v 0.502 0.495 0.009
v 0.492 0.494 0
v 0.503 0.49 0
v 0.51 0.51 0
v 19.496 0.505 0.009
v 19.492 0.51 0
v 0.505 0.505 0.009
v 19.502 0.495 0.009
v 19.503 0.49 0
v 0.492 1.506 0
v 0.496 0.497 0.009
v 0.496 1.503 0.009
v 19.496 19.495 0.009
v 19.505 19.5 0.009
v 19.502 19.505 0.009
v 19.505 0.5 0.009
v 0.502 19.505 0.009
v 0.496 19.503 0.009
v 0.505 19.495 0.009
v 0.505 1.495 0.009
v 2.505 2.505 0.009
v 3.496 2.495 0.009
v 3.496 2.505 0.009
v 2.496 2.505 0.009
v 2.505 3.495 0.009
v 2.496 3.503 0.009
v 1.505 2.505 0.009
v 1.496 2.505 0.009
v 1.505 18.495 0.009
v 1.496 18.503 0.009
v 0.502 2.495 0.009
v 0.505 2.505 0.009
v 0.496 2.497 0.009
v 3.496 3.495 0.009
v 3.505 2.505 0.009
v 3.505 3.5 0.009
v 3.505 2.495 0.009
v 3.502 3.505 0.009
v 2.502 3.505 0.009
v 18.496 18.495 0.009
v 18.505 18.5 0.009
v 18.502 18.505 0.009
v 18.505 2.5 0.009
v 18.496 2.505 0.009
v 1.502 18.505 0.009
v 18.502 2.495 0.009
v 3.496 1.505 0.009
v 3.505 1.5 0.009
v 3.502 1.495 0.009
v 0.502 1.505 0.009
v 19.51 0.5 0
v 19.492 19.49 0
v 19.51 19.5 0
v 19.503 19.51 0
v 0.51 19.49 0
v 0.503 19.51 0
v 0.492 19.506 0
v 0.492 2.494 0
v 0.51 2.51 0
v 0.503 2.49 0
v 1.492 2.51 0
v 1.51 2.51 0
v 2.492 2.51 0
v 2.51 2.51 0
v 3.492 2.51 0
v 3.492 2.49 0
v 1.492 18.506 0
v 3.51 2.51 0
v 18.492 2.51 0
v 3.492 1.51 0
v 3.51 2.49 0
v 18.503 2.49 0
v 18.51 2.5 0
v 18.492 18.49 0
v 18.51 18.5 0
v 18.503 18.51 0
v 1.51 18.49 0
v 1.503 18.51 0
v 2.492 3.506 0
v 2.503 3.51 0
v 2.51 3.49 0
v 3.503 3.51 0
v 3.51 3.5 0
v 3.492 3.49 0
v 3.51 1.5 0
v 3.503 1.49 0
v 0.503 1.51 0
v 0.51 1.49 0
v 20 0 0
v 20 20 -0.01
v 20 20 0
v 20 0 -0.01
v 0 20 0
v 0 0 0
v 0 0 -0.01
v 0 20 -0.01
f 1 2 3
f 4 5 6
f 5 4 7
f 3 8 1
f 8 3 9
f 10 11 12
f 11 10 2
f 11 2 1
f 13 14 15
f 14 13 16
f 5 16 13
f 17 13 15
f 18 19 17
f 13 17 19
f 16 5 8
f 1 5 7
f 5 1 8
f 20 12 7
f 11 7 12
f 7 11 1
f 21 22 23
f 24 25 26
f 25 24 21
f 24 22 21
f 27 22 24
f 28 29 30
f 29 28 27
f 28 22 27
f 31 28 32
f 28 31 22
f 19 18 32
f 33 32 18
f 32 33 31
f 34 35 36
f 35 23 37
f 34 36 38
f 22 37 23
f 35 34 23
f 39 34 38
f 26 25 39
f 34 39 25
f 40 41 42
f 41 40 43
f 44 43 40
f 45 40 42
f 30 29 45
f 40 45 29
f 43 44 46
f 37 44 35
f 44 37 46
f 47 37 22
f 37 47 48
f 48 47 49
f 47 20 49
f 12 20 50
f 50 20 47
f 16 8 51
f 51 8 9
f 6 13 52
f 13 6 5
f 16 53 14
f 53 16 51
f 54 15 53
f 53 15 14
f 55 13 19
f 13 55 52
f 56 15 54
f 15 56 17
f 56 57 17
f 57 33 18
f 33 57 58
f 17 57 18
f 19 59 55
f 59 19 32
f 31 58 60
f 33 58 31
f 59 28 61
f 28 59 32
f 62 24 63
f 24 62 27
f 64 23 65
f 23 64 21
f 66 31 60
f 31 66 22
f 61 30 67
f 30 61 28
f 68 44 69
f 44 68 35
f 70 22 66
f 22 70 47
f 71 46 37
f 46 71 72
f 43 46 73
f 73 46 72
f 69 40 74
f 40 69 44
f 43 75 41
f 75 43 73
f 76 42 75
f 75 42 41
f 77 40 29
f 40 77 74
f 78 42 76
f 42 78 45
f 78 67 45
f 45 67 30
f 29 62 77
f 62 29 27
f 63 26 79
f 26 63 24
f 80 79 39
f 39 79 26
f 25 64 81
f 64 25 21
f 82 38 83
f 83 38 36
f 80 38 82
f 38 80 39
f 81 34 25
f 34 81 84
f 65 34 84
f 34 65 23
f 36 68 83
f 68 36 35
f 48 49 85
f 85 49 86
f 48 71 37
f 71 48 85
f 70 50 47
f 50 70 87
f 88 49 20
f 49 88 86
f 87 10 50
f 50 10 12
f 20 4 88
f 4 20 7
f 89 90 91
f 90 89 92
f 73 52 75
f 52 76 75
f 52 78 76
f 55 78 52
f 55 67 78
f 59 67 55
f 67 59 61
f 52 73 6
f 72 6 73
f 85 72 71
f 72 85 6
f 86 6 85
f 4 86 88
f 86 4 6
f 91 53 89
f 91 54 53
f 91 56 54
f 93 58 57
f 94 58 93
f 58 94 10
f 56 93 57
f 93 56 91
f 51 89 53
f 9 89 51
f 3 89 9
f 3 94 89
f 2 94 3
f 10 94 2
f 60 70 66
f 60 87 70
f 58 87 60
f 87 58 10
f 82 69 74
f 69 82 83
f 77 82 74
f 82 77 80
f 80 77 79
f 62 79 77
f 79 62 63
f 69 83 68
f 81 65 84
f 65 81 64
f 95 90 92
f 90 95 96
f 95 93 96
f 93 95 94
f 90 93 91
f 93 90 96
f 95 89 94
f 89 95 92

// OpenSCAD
hull(){
    translate([0.5, 0.5]) sphere(0.01);
    translate([1.5, 0.5]) sphere(0.01);
}
hull(){
    translate([1.5, 0.5]) sphere(0.01);
    translate([2.5, 0.5]) sphere(0.01);
}
hull(){
    translate([2.5, 0.5]) sphere(0.01);
    translate([3.5, 0.5]) sphere(0.01);
}
hull(){
    translate([3.5, 0.5]) sphere(0.01);
    translate([4.5, 0.5]) sphere(0.01);
}
hull(){
    translate([4.5, 0.5]) sphere(0.01);
    translate([5.5, 0.5]) sphere(0.01);
}
hull(){
    translate([5.5, 0.5]) sphere(0.01);
    translate([6.5, 0.5]) sphere(0.01);
}
hull(){
    translate([6.5, 0.5]) sphere(0.01);
    translate([7.5, 0.5]) sphere(0.01);
}
hull(){
    translate([7.5, 0.5]) sphere(0.01);
    translate([8.5, 0.5]) sphere(0.01);
}
hull(){
    translate([8.5, 0.5]) sphere(0.01);
    translate([9.5, 0.5]) sphere(0.01);
}
hull(){
    translate([9.5, 0.5]) sphere(0.01);
    translate([10.5, 0.5]) sphere(0.01);
}
hull(){
    translate([10.5, 0.5]) sphere(0.01);
    translate([11.5, 0.5]) sphere(0.01);
}
hull(){
    translate([11.5, 0.5]) sphere(0.01);
    translate([12.5, 0.5]) sphere(0.01);
}
hull(){
    translate([12.5, 0.5]) sphere(0.01);
    translate([13.5, 0.5]) sphere(0.01);
}
hull(){
    translate([13.5, 0.5]) sphere(0.01);
    translate([14.5, 0.5]) sphere(0.01);
}
hull(){
    translate([14.5, 0.5]) sphere(0.01);
    translate([15.5, 0.5]) sphere(0.01);
}
hull(){
    translate([15.5, 0.5]) sphere(0.01);
    translate([16.5, 0.5]) sphere(0.01);
}
hull(){
    translate([16.5, 0.5]) sphere(0.01);
    translate([17.5, 0.5]) sphere(0.01);
}
hull(){
    translate([17.5, 0.5]) sphere(0.01);
    translate([18.5, 0.5]) sphere(0.01);
}
hull(){
    translate([18.5, 0.5]) sphere(0.01);
    translate([19.5, 0.5]) sphere(0.01);
}
hull(){
    translate([19.5, 0.5]) sphere(0.01);
    translate([19.5, 1.5]) sphere(0.01);
}
hull(){
    translate([19.5, 1.5]) sphere(0.01);
    translate([19.5, 2.5]) sphere(0.01);
}
hull(){
    translate([19.5, 2.5]) sphere(0.01);
    translate([19.5, 3.5]) sphere(0.01);
}
hull(){
    translate([19.5, 3.5]) sphere(0.01);
    translate([19.5, 4.5]) sphere(0.01);
}
hull(){
    translate([19.5, 4.5]) sphere(0.01);
    translate([19.5, 5.5]) sphere(0.01);
}
hull(){
    translate([19.5, 5.5]) sphere(0.01);
    translate([19.5, 6.5]) sphere(0.01);
}
hull(){
    translate([19.5, 6.5]) sphere(0.01);
    translate([19.5, 7.5]) sphere(0.01);
}
hull(){
    translate([19.5, 7.5]) sphere(0.01);
    translate([19.5, 8.5]) sphere(0.01);
}
hull(){
    translate([19.5, 8.5]) sphere(0.01);
    translate([19.5, 9.5]) sphere(0.01);
}
hull(){
    translate([19.5, 9.5]) sphere(0.01);
    translate([19.5, 10.5]) sphere(0.01);
}
hull(){
    translate([19.5, 10.5]) sphere(0.01);
    translate([19.5, 11.5]) sphere(0.01);
}
hull(){
    translate([19.5, 11.5]) sphere(0.01);
    translate([19.5, 12.5]) sphere(0.01);
}
hull(){
    translate([19.5, 12.5]) sphere(0.01);
    translate([19.5, 13.5]) sphere(0.01);
}
hull(){
    translate([19.5, 13.5]) sphere(0.01);
    translate([19.5, 14.5]) sphere(0.01);
}
hull(){
    translate([19.5, 14.5]) sphere(0.01);
    translate([19.5, 15.5]) sphere(0.01);
}
hull(){
    translate([19.5, 15.5]) sphere(0.01);
    translate([19.5, 16.5]) sphere(0.01);
}
hull(){
    translate([19.5, 16.5]) sphere(0.01);
    translate([19.5, 17.5]) sphere(0.01);
}
hull(){
    translate([19.5, 17.5]) sphere(0.01);
    translate([19.5, 18.5]) sphere(0.01);
}
hull(){
    translate([19.5, 18.5]) sphere(0.01);
    translate([19.5, 19.5]) sphere(0.01);
}
hull(){
    translate([19.5, 19.5]) sphere(0.01);
    translate([18.5, 19.5]) sphere(0.01);
}
hull(){
    translate([18.5, 19.5]) sphere(0.01);
    translate([17.5, 19.5]) sphere(0.01);
}
hull(){
    translate([17.5, 19.5]) sphere(0.01);
    translate([16.5, 19.5]) sphere(0.01);
}
hull(){
    translate([16.5, 19.5]) sphere(0.01);
    translate([15.5, 19.5]) sphere(0.01);
}
hull(){
    translate([15.5, 19.5]) sphere(0.01);
    translate([14.5, 19.5]) sphere(0.01);
}
hull(){
    translate([14.5, 19.5]) sphere(0.01);
    translate([13.5, 19.5]) sphere(0.01);
}
hull(){
    translate([13.5, 19.5]) sphere(0.01);
    translate([12.5, 19.5]) sphere(0.01);
}
hull(){
    translate([12.5, 19.5]) sphere(0.01);
    translate([11.5, 19.5]) sphere(0.01);
}
hull(){
    translate([11.5, 19.5]) sphere(0.01);
    translate([10.5, 19.5]) sphere(0.01);
}
hull(){
    translate([10.5, 19.5]) sphere(0.01);
    translate([9.5, 19.5]) sphere(0.01);
}
hull(){
    translate([9.5, 19.5]) sphere(0.01);
    translate([8.5, 19.5]) sphere(0.01);
}
hull(){
    translate([8.5, 19.5]) sphere(0.01);
    translate([7.5, 19.5]) sphere(0.01);
}
hull(){
    translate([7.5, 19.5]) sphere(0.01);
    translate([6.5, 19.5]) sphere(0.01);
}
hull(){
    translate([6.5, 19.5]) sphere(0.01);
    translate([5.5, 19.5]) sphere(0.01);
}
hull(){
    translate([5.5, 19.5]) sphere(0.01);
    translate([4.5, 19.5]) sphere(0.01);
}
hull(){
    translate([4.5, 19.5]) sphere(0.01);
    translate([3.5, 19.5]) sphere(0.01);
}
hull(){
    translate([3.5, 19.5]) sphere(0.01);
    translate([2.5, 19.5]) sphere(0.01);
}
hull(){
    translate([2.5, 19.5]) sphere(0.01);
    translate([1.5, 19.5]) sphere(0.01);
}
hull(){
    translate([1.5, 19.5]) sphere(0.01);
    translate([0.5, 19.5]) sphere(0.01);
}
hull(){
    translate([0.5, 19.5]) sphere(0.01);
    translate([0.5, 18.5]) sphere(0.01);
}
hull(){
    translate([0.5, 18.5]) sphere(0.01);
    translate([0.5, 17.5]) sphere(0.01);
}
hull(){
    translate([0.5, 17.5]) sphere(0.01);
    translate([0.5, 16.5]) sphere(0.01);
}
hull(){
    translate([0.5, 16.5]) sphere(0.01);
    translate([0.5, 15.5]) sphere(0.01);
}
hull(){
    translate([0.5, 15.5]) sphere(0.01);
    translate([0.5, 14.5]) sphere(0.01);
}
hull(){
    translate([0.5, 14.5]) sphere(0.01);
    translate([0.5, 13.5]) sphere(0.01);
}
hull(){
    translate([0.5, 13.5]) sphere(0.01);
    translate([0.5, 12.5]) sphere(0.01);
}
hull(){
    translate([0.5, 12.5]) sphere(0.01);
    translate([0.5, 11.5]) sphere(0.01);
}
hull(){
    translate([0.5, 11.5]) sphere(0.01);
    translate([0.5, 10.5]) sphere(0.01);
}
hull(){
    translate([0.5, 10.5]) sphere(0.01);
    translate([0.5, 9.5]) sphere(0.01);
}
hull(){
    translate([0.5, 9.5]) sphere(0.01);
    translate([0.5, 8.5]) sphere(0.01);
}
hull(){
    translate([0.5, 8.5]) sphere(0.01);
    translate([0.5, 7.5]) sphere(0.01);
}
hull(){
    translate([0.5, 7.5]) sphere(0.01);
    translate([0.5, 6.5]) sphere(0.01);
}
hull(){
    translate([0.5, 6.5]) sphere(0.01);
    translate([0.5, 5.5]) sphere(0.01);
}
hull(){
    translate([0.5, 5.5]) sphere(0.01);
    translate([0.5, 4.5]) sphere(0.01);
}
hull(){
    translate([0.5, 4.5]) sphere(0.01);
    translate([0.5, 3.5]) sphere(0.01);
}
hull(){
    translate([0.5, 3.5]) sphere(0.01);
    translate([0.5, 2.5]) sphere(0.01);
}
hull(){
    translate([0.5, 2.5]) sphere(0.01);
    translate([1.5, 2.5]) sphere(0.01);
}
hull(){
    translate([1.5, 2.5]) sphere(0.01);
    translate([2.5, 2.5]) sphere(0.01);
}
hull(){
    translate([2.5, 2.5]) sphere(0.01);
    translate([3.5, 2.5]) sphere(0.01);
}
hull(){
    translate([3.5, 2.5]) sphere(0.01);
    translate([4.5, 2.5]) sphere(0.01);
}
hull(){
    translate([4.5, 2.5]) sphere(0.01);
    translate([5.5, 2.5]) sphere(0.01);
}
hull(){
    translate([5.5, 2.5]) sphere(0.01);
    translate([6.5, 2.5]) sphere(0.01);
}
hull(){
    translate([6.5, 2.5]) sphere(0.01);
    translate([7.5, 2.5]) sphere(0.01);
}
hull(){
    translate([7.5, 2.5]) sphere(0.01);
    translate([8.5, 2.5]) sphere(0.01);
}
hull(){
    translate([8.5, 2.5]) sphere(0.01);
    translate([9.5, 2.5]) sphere(0.01);
}
hull(){
    translate([9.5, 2.5]) sphere(0.01);
    translate([10.5, 2.5]) sphere(0.01);
}
hull(){
    translate([10.5, 2.5]) sphere(0.01);
    translate([11.5, 2.5]) sphere(0.01);
}
hull(){
    translate([11.5, 2.5]) sphere(0.01);
    translate([12.5, 2.5]) sphere(0.01);
}
hull(){
    translate([12.5, 2.5]) sphere(0.01);
    translate([13.5, 2.5]) sphere(0.01);
}
hull(){
    translate([13.5, 2.5]) sphere(0.01);
    translate([14.5, 2.5]) sphere(0.01);
}
hull(){
    translate([14.5, 2.5]) sphere(0.01);
    translate([15.5, 2.5]) sphere(0.01);
}
hull(){
    translate([15.5, 2.5]) sphere(0.01);
    translate([16.5, 2.5]) sphere(0.01);
}
hull(){
    translate([16.5, 2.5]) sphere(0.01);
    translate([17.5, 2.5]) sphere(0.01);
}
hull(){
    translate([17.5, 2.5]) sphere(0.01);
    translate([18.5, 2.5]) sphere(0.01);
}
hull(){
    translate([18.5, 2.5]) sphere(0.01);
    translate([18.5, 3.5]) sphere(0.01);
}
hull(){
    translate([18.5, 3.5]) sphere(0.01);
    translate([18.5, 4.5]) sphere(0.01);
}
hull(){
    translate([18.5, 4.5]) sphere(0.01);
    translate([18.5, 5.5]) sphere(0.01);
}
hull(){
    translate([18.5, 5.5]) sphere(0.01);
    translate([18.5, 6.5]) sphere(0.01);
}
hull(){
    translate([18.5, 6.5]) sphere(0.01);
    translate([18.5, 7.5]) sphere(0.01);
}
hull(){
    translate([18.5, 7.5]) sphere(0.01);
    translate([18.5, 8.5]) sphere(0.01);
}
hull(){
    translate([18.5, 8.5]) sphere(0.01);
    translate([18.5, 9.5]) sphere(0.01);
}
hull(){
    translate([18.5, 9.5]) sphere(0.01);
    translate([18.5, 10.5]) sphere(0.01);
}
hull(){
    translate([18.5, 10.5]) sphere(0.01);
    translate([18.5, 11.5]) sphere(0.01);
}
hull(){
    translate([18.5, 11.5]) sphere(0.01);
    translate([18.5, 12.5]) sphere(0.01);
}
hull(){
    translate([18.5, 12.5]) sphere(0.01);
    translate([18.5, 13.5]) sphere(0.01);
}
hull(){
    translate([18.5, 13.5]) sphere(0.01);
    translate([18.5, 14.5]) sphere(0.01);
}
hull(){
    translate([18.5, 14.5]) sphere(0.01);
    translate([18.5, 15.5]) sphere(0.01);
}
hull(){
    translate([18.5, 15.5]) sphere(0.01);
    translate([18.5, 16.5]) sphere(0.01);
}
hull(){
    translate([18.5, 16.5]) sphere(0.01);
    translate([18.5, 17.5]) sphere(0.01);
}
hull(){
    translate([18.5, 17.5]) sphere(0.01);
    translate([18.5, 18.5]) sphere(0.01);
}
hull(){
    translate([18.5, 18.5]) sphere(0.01);
    translate([17.5, 18.5]) sphere(0.01);
}
hull(){
    translate([17.5, 18.5]) sphere(0.01);
    translate([16.5, 18.5]) sphere(0.01);
}
hull(){
    translate([16.5, 18.5]) sphere(0.01);
    translate([15.5, 18.5]) sphere(0.01);
}
hull(){
    translate([15.5, 18.5]) sphere(0.01);
    translate([14.5, 18.5]) sphere(0.01);
}
hull(){
    translate([14.5, 18.5]) sphere(0.01);
    translate([13.5, 18.5]) sphere(0.01);
}
hull(){
    translate([13.5, 18.5]) sphere(0.01);
    translate([12.5, 18.5]) sphere(0.01);
}
hull(){
    translate([12.5, 18.5]) sphere(0.01);
    translate([11.5, 18.5]) sphere(0.01);
}
hull(){
    translate([11.5, 18.5]) sphere(0.01);
    translate([10.5, 18.5]) sphere(0.01);
}
hull(){
    translate([10.5, 18.5]) sphere(0.01);
    translate([9.5, 18.5]) sphere(0.01);
}
hull(){
    translate([9.5, 18.5]) sphere(0.01);
    translate([8.5, 18.5]) sphere(0.01);
}
hull(){
    translate([8.5, 18.5]) sphere(0.01);
    translate([7.5, 18.5]) sphere(0.01);
}
hull(){
    translate([7.5, 18.5]) sphere(0.01);
    translate([6.5, 18.5]) sphere(0.01);
}
hull(){
    translate([6.5, 18.5]) sphere(0.01);
    translate([5.5, 18.5]) sphere(0.01);
}
hull(){
    translate([5.5, 18.5]) sphere(0.01);
    translate([4.5, 18.5]) sphere(0.01);
}
hull(){
    translate([4.5, 18.5]) sphere(0.01);
    translate([3.5, 18.5]) sphere(0.01);
}
hull(){
    translate([3.5, 18.5]) sphere(0.01);
    translate([2.5, 18.5]) sphere(0.01);
}
hull(){
    translate([2.5, 18.5]) sphere(0.01);
    translate([1.5, 18.5]) sphere(0.01);
}
hull(){
    translate([1.5, 18.5]) sphere(0.01);
    translate([1.5, 17.5]) sphere(0.01);
}
hull(){
    translate([1.5, 17.5]) sphere(0.01);
    translate([1.5, 16.5]) sphere(0.01);
}
hull(){
    translate([1.5, 16.5]) sphere(0.01);
    translate([1.5, 15.5]) sphere(0.01);
}
hull(){
    translate([1.5, 15.5]) sphere(0.01);
    translate([1.5, 14.5]) sphere(0.01);
}
hull(){
    translate([1.5, 14.5]) sphere(0.01);
    translate([1.5, 13.5]) sphere(0.01);
}
hull(){
    translate([1.5, 13.5]) sphere(0.01);
    translate([1.5, 12.5]) sphere(0.01);
}
hull(){
    translate([1.5, 12.5]) sphere(0.01);
    translate([1.5, 11.5]) sphere(0.01);
}
hull(){
    translate([1.5, 11.5]) sphere(0.01);
    translate([1.5, 10.5]) sphere(0.01);
}
hull(){
    translate([1.5, 10.5]) sphere(0.01);
    translate([1.5, 9.5]) sphere(0.01);
}
hull(){
    translate([1.5, 9.5]) sphere(0.01);
    translate([1.5, 8.5]) sphere(0.01);
}
hull(){
    translate([1.5, 8.5]) sphere(0.01);
    translate([1.5, 7.5]) sphere(0.01);
}
hull(){
    translate([1.5, 7.5]) sphere(0.01);
    translate([1.5, 6.5]) sphere(0.01);
}
hull(){
    translate([1.5, 6.5]) sphere(0.01);
    translate([1.5, 5.5]) sphere(0.01);
}
hull(){
    translate([1.5, 5.5]) sphere(0.01);
    translate([1.5, 4.5]) sphere(0.01);
}
hull(){
    translate([1.5, 4.5]) sphere(0.01);
    translate([1.5, 3.5]) sphere(0.01);
}
hull(){
    translate([1.5, 3.5]) sphere(0.01);
    translate([1.5, 2.5]) sphere(0.01);
}
hull(){
    translate([1.5, 2.5]) sphere(0.01);
    translate([2.5, 2.5]) sphere(0.01);
}
hull(){
    translate([2.5, 2.5]) sphere(0.01);
    translate([2.5, 3.5]) sphere(0.01);
}
hull(){
    translate([2.5, 3.5]) sphere(0.01);
    translate([3.5, 3.5]) sphere(0.01);
}
hull(){
    translate([3.5, 3.5]) sphere(0.01);
    translate([3.5, 2.5]) sphere(0.01);
}
hull(){
    translate([3.5, 2.5]) sphere(0.01);
    translate([3.5, 1.5]) sphere(0.01);
}
hull(){
    translate([3.5, 1.5]) sphere(0.01);
    translate([2.5, 1.5]) sphere(0.01);
}
hull(){
    translate([2.5, 1.5]) sphere(0.01);
    translate([1.5, 1.5]) sphere(0.01);
}
hull(){
    translate([1.5, 1.5]) sphere(0.01);
    translate([0.5, 1.5]) sphere(0.01);
}
hull(){
    translate([0.5, 1.5]) sphere(0.01);
    translate([0.5, 0.5]) sphere(0.01);
}
translate([0,0,-0.01]) color([0.1,0.1,0.1]) cube([20,20,0.01]);
